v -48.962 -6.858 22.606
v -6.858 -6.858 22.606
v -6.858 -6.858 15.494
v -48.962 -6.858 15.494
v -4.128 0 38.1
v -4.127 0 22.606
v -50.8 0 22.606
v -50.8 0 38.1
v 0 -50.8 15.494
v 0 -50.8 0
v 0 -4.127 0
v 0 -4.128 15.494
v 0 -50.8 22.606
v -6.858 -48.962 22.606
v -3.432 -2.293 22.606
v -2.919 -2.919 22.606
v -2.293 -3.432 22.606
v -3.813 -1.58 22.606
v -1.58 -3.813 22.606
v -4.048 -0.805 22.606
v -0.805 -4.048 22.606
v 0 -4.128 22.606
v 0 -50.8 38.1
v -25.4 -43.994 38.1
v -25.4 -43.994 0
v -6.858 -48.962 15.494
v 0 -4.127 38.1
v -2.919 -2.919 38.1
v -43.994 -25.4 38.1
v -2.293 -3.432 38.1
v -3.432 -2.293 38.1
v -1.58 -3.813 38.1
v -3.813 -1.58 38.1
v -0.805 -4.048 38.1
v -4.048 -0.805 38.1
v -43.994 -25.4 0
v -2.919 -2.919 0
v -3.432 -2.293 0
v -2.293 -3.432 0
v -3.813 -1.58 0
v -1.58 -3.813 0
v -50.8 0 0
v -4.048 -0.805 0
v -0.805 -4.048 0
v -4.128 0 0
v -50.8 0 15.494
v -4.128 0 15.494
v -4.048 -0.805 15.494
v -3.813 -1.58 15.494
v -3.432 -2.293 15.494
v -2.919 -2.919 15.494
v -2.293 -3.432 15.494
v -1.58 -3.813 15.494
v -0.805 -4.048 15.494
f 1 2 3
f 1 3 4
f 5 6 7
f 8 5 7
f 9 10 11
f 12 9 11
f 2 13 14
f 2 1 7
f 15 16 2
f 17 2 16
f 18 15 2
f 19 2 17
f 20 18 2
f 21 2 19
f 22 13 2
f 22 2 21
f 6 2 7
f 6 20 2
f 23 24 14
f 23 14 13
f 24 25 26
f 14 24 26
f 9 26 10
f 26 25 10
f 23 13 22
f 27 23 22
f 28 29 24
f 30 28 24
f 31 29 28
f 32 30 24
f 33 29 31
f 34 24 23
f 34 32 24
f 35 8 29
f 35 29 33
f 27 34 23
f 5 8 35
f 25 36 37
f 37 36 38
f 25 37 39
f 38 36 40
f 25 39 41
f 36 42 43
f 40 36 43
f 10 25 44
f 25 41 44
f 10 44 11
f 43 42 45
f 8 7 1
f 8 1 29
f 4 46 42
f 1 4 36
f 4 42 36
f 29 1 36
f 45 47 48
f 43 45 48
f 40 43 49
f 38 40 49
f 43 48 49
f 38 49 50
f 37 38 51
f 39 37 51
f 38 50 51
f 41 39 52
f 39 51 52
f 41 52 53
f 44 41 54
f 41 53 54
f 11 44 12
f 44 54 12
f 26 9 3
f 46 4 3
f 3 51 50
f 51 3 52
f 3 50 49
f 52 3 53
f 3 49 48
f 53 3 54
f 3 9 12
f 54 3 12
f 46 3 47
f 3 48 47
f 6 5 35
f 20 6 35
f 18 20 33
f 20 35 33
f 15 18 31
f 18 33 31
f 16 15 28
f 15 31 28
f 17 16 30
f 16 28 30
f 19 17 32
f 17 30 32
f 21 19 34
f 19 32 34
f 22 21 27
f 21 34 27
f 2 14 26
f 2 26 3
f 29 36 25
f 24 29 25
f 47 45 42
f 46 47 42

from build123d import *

# Parameters (mm, degrees)
F1_DEPTH = 38.1
F3_W     = 50.8
F3_H     = 7.112
F4_DEPTH = 6.858
F2_W     = 50.8
F2_H     = 7.112
F5_DEPTH = 6.858
F6_R     = 4.1275
F7_DEPTH = 39.624


with BuildPart() as f1:
    # F0 (on Top) → F1 (new body)
    with BuildSketch(Plane.XY):
        Polygon((-25.4, -43.994091), (0, -50.8), (0, 0), (-50.8, 0), (-43.994091, -25.4), align=None)
    extrude(amount=F1_DEPTH)

    # F3 (on face) → F4 (cut)
    with BuildSketch(Plane.YZ):
        with Locations((-25.4, 19.05)):
            Rectangle(F3_W, F3_H)
    extrude(amount=-F4_DEPTH, mode=Mode.SUBTRACT)

    # F2 (on face) → F5 (cut)
    with BuildSketch(Plane(origin=(0, 0, 0), x_dir=(-1, 0, 0), z_dir=(0, 1, 0))):
        with Locations((25.4, 19.05)):
            Rectangle(F2_W, F2_H)
    extrude(amount=-F5_DEPTH, mode=Mode.SUBTRACT)

    # F6 (on face) → F7 (cut)
    with BuildSketch(Plane.XY.offset(38.1)):
        Circle(F6_R)
    extrude(amount=-F7_DEPTH, mode=Mode.SUBTRACT)


solid = f1.part
